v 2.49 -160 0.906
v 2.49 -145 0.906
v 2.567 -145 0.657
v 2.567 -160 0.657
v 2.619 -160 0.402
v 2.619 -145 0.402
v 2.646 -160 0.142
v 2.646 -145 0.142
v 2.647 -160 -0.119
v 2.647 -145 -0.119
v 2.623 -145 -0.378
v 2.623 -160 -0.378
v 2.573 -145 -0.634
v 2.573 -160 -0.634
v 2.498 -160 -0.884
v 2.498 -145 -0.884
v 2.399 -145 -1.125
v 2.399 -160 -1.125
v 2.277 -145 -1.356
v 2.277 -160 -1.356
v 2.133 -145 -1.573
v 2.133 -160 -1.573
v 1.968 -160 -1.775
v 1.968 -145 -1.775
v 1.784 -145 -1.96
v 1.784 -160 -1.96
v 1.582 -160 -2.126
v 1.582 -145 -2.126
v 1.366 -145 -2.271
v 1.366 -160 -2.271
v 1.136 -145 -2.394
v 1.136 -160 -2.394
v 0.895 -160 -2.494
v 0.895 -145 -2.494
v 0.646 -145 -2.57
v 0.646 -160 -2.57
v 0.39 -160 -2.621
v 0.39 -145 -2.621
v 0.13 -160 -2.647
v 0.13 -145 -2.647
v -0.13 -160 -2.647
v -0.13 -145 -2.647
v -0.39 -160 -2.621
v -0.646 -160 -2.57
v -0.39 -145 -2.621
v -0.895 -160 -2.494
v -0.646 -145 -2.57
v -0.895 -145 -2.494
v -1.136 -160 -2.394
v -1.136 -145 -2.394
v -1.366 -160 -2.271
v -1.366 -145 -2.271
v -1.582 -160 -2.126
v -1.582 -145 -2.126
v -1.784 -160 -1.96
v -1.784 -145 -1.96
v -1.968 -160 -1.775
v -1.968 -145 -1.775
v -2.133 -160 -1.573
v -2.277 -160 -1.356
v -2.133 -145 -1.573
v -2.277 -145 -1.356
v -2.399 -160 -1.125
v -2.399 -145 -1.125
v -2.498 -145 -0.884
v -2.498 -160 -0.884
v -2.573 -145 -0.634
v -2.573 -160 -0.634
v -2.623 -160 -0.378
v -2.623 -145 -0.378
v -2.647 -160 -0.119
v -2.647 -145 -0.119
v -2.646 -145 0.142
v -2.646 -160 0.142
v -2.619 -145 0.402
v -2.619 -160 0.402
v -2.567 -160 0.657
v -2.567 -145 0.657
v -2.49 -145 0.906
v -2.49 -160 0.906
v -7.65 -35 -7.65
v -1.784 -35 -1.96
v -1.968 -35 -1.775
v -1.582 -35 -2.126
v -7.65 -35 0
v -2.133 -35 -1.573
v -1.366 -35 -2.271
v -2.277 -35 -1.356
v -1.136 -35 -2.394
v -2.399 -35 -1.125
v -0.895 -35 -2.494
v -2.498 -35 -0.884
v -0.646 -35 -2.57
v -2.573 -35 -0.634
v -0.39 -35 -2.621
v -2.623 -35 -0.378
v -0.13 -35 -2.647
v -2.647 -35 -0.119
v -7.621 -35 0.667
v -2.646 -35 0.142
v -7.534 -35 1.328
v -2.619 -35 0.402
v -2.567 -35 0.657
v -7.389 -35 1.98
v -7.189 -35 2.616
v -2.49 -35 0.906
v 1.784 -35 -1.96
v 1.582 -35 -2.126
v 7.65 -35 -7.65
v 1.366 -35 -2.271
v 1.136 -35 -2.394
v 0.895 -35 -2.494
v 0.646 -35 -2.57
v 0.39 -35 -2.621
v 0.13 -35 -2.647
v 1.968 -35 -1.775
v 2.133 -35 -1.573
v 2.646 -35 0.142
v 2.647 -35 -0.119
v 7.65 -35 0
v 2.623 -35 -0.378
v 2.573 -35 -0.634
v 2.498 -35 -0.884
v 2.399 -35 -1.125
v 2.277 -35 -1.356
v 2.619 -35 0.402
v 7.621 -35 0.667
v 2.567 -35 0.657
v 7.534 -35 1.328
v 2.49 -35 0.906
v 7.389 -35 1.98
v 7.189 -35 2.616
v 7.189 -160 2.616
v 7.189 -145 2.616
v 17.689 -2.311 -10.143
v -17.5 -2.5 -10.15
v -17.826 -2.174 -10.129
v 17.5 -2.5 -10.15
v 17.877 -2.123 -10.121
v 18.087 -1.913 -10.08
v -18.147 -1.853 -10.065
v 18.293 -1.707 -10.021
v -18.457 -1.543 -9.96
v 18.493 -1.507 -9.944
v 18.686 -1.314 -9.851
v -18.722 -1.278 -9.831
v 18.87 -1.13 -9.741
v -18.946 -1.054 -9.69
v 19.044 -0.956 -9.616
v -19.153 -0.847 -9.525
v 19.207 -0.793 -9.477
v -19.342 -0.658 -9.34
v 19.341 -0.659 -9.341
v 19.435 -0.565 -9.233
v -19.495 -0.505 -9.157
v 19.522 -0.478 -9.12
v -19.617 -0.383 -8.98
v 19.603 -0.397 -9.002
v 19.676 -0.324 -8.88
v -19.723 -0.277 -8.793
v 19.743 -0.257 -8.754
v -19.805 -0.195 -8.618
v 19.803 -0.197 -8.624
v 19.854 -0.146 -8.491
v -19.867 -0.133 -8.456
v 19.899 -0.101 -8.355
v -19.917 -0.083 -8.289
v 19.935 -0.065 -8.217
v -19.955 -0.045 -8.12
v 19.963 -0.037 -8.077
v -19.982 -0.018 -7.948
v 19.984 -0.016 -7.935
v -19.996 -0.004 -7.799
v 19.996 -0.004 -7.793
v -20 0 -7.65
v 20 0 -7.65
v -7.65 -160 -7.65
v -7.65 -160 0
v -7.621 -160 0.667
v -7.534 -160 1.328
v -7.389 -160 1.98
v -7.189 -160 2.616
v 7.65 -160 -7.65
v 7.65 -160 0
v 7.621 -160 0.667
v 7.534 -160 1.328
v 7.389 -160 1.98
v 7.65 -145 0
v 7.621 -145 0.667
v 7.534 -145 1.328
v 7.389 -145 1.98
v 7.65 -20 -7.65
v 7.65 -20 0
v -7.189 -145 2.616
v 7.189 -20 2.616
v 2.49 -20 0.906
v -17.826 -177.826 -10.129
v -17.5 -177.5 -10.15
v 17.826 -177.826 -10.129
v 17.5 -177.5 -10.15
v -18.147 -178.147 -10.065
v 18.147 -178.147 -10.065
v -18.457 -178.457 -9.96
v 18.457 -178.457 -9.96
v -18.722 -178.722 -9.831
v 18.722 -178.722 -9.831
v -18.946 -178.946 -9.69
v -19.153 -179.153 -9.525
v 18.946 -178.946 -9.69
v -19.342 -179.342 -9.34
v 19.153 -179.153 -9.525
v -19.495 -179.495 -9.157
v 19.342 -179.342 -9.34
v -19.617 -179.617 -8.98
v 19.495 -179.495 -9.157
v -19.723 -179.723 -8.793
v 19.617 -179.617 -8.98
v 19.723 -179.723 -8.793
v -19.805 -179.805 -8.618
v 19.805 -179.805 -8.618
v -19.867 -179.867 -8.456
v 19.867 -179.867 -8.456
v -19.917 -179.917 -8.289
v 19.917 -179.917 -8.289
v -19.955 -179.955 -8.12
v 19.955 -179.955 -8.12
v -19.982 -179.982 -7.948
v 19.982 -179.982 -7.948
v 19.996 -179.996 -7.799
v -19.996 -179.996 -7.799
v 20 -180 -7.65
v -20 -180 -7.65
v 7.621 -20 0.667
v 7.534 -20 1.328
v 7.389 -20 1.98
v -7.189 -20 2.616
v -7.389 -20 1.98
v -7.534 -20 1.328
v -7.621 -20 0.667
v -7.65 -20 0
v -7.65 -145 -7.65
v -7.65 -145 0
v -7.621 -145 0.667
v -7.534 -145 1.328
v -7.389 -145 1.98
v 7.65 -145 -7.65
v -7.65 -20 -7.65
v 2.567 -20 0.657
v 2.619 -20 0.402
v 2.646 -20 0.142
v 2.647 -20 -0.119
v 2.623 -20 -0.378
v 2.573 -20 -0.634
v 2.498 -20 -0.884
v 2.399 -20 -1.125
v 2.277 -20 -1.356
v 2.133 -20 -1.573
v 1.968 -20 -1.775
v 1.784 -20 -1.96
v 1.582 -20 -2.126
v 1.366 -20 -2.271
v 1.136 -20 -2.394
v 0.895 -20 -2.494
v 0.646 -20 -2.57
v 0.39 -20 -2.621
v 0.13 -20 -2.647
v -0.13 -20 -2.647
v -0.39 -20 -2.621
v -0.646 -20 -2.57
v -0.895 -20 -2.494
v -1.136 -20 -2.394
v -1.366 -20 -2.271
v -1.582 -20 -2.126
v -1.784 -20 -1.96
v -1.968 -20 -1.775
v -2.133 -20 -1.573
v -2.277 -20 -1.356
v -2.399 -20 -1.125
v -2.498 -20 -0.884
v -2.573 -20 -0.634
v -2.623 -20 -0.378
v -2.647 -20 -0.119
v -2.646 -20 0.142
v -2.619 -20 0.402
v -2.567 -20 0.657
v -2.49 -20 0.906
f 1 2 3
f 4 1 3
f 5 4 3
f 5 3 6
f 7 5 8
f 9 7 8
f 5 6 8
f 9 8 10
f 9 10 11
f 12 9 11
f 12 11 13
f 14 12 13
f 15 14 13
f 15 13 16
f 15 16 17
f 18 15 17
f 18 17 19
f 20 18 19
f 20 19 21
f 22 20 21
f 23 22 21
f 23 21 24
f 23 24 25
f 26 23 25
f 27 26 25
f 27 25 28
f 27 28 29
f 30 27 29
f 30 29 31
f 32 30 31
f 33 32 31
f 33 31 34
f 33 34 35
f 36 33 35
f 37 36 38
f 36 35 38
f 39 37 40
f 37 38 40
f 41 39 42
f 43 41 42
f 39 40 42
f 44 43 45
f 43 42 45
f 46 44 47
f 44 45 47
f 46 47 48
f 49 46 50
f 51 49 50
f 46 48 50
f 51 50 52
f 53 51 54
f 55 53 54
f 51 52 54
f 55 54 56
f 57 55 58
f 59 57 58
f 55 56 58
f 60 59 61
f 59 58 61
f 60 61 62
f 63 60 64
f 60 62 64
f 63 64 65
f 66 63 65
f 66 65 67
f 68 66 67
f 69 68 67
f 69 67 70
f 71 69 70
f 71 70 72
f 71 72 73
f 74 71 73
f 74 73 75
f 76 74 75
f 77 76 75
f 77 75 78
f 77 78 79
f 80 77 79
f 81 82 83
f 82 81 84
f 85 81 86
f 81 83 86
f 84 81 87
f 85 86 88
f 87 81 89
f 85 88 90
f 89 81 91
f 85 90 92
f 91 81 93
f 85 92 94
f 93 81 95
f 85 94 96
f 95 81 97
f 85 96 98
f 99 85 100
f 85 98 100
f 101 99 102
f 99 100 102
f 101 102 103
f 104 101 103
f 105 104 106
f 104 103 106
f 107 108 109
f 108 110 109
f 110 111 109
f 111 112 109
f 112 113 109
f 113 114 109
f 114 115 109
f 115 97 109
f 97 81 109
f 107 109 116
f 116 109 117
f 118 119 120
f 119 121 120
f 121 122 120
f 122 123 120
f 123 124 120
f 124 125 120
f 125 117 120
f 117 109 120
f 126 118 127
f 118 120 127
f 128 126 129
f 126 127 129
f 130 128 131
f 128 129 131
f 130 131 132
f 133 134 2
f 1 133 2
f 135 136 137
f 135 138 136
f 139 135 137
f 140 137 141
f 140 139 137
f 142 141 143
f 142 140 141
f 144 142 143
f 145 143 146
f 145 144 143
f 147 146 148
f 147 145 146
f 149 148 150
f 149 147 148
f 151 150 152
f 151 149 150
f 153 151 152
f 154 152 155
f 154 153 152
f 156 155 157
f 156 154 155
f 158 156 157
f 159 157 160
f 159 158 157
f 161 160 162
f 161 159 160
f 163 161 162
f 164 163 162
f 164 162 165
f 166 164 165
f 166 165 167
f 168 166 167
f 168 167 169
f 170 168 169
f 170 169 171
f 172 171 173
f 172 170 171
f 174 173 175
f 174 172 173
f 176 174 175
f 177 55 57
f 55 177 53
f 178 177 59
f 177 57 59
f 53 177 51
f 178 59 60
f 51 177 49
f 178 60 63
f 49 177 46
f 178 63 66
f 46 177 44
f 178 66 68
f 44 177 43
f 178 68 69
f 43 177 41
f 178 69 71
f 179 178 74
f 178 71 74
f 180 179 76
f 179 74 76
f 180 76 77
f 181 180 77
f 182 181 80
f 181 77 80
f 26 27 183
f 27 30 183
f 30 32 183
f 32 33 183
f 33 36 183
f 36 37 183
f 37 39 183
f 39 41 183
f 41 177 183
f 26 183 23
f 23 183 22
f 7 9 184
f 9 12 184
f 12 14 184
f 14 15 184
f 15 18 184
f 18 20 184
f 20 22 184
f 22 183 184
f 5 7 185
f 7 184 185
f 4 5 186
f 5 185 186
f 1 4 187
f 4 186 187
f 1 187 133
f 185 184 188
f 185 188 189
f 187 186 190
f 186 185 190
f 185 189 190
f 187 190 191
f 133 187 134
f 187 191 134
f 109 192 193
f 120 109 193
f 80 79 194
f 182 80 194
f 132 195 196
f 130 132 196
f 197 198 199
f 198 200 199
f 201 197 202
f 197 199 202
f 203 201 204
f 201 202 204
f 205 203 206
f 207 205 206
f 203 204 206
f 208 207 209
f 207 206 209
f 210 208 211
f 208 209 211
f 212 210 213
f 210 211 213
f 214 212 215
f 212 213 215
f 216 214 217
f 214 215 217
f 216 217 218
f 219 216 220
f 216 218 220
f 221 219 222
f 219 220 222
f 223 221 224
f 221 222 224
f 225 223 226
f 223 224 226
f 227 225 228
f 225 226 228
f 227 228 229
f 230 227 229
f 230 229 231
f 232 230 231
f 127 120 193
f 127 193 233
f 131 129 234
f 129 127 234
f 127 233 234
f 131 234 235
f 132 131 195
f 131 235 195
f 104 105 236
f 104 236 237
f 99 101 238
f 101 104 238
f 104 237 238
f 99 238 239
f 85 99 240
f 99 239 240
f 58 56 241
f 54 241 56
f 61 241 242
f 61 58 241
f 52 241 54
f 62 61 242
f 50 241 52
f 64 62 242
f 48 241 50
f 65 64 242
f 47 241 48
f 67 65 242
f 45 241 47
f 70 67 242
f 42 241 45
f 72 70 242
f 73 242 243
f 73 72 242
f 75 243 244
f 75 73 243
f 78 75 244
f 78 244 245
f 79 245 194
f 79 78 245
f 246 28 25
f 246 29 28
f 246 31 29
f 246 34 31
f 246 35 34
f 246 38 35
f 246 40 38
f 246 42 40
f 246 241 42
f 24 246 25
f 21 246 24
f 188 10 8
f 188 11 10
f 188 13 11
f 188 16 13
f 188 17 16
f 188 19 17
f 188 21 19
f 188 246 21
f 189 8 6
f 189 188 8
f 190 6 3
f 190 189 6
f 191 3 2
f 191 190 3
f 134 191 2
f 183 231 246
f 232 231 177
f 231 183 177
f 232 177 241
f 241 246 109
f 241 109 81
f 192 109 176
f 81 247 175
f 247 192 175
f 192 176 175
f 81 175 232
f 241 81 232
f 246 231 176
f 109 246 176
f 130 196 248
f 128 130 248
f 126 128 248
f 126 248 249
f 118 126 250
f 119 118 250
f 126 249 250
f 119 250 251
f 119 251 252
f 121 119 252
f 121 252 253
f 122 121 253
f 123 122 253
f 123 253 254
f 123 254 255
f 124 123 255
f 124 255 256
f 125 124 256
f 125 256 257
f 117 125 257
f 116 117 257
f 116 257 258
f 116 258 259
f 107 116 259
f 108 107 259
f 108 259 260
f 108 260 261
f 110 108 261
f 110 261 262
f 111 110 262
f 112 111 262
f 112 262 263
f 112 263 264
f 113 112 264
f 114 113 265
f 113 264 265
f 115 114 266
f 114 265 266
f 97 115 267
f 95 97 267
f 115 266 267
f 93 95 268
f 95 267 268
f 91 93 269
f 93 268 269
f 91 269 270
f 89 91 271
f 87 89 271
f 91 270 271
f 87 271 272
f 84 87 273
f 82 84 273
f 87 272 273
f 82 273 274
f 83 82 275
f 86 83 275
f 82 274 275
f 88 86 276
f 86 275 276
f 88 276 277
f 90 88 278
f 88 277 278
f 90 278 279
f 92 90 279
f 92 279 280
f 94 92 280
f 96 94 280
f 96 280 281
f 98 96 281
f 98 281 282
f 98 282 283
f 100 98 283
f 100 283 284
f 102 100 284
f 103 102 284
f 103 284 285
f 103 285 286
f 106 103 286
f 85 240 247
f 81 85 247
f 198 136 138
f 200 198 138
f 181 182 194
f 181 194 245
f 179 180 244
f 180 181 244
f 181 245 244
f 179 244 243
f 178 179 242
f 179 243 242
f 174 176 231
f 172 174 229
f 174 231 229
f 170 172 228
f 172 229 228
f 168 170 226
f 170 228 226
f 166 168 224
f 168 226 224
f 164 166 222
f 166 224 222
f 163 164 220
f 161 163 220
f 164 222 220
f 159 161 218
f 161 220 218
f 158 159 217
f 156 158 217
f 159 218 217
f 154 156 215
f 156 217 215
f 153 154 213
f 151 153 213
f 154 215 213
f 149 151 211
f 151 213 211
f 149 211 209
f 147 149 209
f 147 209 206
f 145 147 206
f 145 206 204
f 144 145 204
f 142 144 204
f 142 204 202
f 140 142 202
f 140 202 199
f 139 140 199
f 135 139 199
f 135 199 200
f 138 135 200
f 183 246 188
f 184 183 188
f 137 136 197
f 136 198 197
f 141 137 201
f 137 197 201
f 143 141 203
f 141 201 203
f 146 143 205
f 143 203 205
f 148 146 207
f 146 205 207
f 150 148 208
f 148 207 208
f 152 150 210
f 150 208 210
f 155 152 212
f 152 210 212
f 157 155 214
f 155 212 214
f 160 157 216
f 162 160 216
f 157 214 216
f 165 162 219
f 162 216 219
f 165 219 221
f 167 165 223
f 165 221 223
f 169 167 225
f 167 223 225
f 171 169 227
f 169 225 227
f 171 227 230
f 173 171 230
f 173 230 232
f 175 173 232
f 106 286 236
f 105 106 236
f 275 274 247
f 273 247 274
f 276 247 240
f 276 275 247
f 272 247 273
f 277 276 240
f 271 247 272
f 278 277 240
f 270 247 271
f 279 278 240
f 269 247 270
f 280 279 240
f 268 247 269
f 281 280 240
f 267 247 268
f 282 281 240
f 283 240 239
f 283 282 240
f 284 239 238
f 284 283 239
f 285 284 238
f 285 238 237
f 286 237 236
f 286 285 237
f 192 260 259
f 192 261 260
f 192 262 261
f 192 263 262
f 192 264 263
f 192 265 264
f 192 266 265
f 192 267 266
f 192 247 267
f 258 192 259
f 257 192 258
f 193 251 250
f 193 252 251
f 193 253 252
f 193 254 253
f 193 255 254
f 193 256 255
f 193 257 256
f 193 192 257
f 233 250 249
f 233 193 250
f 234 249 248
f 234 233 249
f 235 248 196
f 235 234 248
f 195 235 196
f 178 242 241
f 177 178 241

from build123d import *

# Parameters (mm, degrees)
F1_DEPTH = 180
F2_W     = 10.35
F2_H     = 20
F2_H_2   = 110
F3_DEPTH = 25
F4_DEPTH = 25
F5_DEPTH = 25
F6_R     = 2.49999


# Not quite as in the source:
# - a fillet or chamfer is up to 0.001 mm smaller than in the source, because OpenCascade refuses the exact size


with BuildPart() as f1:
    # F0 (on Front) → F1 (new body)
    with BuildSketch(Plane.XZ):
        with BuildLine():
            ThreePointArc((2.4901854451, 0.9063533798), (0, -2.65), (-2.4901854451, 0.9063533798))
            Line((-2.4901854451, 0.9063533798), (-7.188648549, 2.6164540964))
            ThreePointArc((-7.188648549, 2.6164540964), (-7.5337793105, 1.3284085592), (-7.65, 0))
            ThreePointArc((-7.65, 0), (-5.4093668761, -5.4093668761), (0, -7.65))
            ThreePointArc((0, -7.65), (5.4093668761, -5.4093668761), (7.65, 0))
            ThreePointArc((7.65, 0), (7.5337793105, 1.3284085592), (7.188648549, 2.6164540964))
            Line((7.188648549, 2.6164540964), (2.4901854451, 0.9063533798))
        make_face()
        with BuildLine():
            ThreePointArc((0, -7.65), (-5.4093668761, -5.4093668761), (-7.65, 0))
            Line((-7.65, 0), (-7.65, -7.65))
            Line((-7.65, -7.65), (0, -7.65))
        make_face()
        with BuildLine():
            Line((7.65, -7.65), (7.65, 0))
            ThreePointArc((7.65, 0), (5.4093668761, -5.4093668761), (0, -7.65))
            Line((0, -7.65), (7.65, -7.65))
        make_face()
        Polygon((7.65, -7.65), (0, -7.65), (-7.65, -7.65), (-20, -7.65), (-20, -10.15), (20, -10.15), (20, -7.65), align=None)
    extrude(amount=F1_DEPTH)

    # F2 (on face) → F3 (join)
    with BuildSketch(Plane.XY.offset(-7.65)):
        with Locations((14.825, -170)):
            Rectangle(F2_W, F2_H)
        with Locations((14.825, -90)):
            Rectangle(F2_W, F2_H_2)
        with Locations((14.825, -10)):
            Rectangle(F2_W, F2_H)
    extrude(amount=F3_DEPTH)

    # F4 (cut): faces of the model
    f4_faces = [f1.faces().sort_by_distance(p)[0] for p in [
        (9.65, -10, 4.85),
        (9.65, -90, 4.85),
        (9.65, -170, 4.85),
    ]]
    extrude(f4_faces, amount=F4_DEPTH, mode=Mode.SUBTRACT)

    # F5 (cut): faces of the model
    f5_faces = [f1.faces().sort_by_distance(p)[0] for p in [
        (9.65, -10, 4.85),
        (9.65, -90, 4.85),
        (9.65, -170, 4.85),
    ]]
    extrude(f5_faces, amount=-F5_DEPTH, mode=Mode.SUBTRACT)

    # F6 (radius 2.5 in the source; OpenCascade refuses exactly that, so slightly less here)
    f6_edges = [f1.edges().sort_by_distance(p)[0] for p in [
        (-20, -90, -10.15),
        (0, -180, -10.15),
        (20, -90, -10.15),
        (0, 0, -10.15),
    ]]
    fillet(f6_edges, radius=F6_R)


solid = f1.part
